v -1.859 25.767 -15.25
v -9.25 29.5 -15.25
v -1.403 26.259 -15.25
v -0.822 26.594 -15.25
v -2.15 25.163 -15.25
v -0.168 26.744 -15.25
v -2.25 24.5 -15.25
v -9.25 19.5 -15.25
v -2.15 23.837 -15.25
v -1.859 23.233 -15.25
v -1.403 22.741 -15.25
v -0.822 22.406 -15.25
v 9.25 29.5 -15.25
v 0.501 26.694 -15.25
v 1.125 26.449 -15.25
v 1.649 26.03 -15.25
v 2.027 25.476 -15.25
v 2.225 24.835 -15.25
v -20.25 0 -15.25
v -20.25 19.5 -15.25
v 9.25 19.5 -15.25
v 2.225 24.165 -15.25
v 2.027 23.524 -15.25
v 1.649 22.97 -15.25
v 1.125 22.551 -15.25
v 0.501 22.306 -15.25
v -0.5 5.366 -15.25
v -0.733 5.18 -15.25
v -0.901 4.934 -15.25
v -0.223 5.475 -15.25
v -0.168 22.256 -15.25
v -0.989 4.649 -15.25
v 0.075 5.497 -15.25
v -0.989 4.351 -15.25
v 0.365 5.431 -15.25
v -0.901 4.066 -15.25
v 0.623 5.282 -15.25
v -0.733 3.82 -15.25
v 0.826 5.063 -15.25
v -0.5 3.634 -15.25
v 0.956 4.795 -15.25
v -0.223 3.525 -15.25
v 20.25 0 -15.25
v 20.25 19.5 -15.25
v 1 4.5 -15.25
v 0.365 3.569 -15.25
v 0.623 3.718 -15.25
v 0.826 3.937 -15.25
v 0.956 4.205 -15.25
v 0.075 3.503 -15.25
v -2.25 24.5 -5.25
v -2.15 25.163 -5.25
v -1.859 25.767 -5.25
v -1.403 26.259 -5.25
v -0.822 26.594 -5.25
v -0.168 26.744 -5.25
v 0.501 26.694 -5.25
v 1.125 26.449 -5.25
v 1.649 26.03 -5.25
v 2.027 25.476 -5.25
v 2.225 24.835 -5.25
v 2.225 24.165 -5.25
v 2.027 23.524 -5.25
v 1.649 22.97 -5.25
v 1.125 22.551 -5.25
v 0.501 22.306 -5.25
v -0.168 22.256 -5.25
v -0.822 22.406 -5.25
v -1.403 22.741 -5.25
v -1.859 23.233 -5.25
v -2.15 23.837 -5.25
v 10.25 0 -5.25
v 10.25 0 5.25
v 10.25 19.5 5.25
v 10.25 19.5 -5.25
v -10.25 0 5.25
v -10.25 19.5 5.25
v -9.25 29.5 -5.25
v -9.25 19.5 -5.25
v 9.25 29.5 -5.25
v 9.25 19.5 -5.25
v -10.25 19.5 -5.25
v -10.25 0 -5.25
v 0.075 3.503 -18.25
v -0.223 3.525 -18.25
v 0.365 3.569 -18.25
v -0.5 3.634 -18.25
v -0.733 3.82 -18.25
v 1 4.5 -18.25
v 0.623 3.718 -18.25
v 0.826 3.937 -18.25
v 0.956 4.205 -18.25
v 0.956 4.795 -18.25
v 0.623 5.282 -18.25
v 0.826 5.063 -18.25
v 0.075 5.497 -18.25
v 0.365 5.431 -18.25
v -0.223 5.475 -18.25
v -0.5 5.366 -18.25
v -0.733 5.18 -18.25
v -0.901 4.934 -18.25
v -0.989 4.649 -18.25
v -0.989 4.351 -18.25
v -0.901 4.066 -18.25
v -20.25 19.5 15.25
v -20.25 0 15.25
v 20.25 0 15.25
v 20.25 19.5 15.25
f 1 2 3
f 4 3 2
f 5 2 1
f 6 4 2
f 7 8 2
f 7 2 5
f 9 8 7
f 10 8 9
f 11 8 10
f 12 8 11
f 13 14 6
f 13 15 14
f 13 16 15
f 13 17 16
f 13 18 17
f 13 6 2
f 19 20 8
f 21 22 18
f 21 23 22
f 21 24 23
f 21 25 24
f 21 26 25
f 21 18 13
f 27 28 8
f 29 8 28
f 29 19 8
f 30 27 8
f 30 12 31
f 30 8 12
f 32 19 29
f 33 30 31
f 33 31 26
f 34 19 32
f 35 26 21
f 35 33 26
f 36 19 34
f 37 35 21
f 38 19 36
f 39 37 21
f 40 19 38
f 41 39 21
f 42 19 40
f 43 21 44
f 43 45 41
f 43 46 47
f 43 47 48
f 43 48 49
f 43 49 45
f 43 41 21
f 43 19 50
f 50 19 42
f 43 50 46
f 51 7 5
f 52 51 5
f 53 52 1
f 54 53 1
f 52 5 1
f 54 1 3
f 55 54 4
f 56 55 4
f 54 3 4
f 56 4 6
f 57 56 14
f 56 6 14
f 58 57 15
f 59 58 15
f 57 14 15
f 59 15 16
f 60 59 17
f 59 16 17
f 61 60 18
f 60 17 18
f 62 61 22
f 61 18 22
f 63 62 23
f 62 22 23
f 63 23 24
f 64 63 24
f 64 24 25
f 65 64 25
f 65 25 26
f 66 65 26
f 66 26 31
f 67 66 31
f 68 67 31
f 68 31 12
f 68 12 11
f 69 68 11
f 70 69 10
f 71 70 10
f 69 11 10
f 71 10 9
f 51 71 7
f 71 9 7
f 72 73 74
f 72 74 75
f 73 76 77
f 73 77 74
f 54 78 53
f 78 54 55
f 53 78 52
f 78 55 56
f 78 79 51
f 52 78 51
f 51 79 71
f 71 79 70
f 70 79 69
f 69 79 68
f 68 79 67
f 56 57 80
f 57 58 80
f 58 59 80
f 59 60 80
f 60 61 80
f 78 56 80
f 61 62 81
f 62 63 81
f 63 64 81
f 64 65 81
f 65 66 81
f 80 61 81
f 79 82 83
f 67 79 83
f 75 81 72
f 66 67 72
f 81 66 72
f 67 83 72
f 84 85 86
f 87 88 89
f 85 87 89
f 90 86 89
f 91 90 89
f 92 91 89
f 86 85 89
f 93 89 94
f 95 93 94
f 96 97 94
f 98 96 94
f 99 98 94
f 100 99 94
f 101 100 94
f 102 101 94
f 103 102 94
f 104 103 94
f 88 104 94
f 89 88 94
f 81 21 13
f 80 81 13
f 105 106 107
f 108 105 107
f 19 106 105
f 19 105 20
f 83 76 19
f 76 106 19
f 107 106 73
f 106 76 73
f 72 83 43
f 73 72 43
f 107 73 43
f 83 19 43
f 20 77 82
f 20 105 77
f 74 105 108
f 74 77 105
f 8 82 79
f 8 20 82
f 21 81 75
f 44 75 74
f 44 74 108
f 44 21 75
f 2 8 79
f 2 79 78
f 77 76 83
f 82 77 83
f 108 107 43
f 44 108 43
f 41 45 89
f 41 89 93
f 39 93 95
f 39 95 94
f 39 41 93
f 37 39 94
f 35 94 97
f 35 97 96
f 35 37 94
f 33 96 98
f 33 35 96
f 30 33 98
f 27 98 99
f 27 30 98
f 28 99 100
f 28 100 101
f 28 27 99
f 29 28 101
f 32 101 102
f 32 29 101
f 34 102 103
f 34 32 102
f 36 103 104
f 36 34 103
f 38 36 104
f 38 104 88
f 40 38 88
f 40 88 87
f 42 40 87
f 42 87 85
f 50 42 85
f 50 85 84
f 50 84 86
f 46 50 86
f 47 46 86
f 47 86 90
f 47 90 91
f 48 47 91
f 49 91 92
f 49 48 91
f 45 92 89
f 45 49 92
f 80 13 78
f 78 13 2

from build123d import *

# Parameters (mm, degrees)
SKETCH1_W           = 40.5
SKETCH1_H           = 30.5
SKETCH1_W_2         = 20.5
SKETCH1_H_2         = 10.5
BOSS_EXTRUDE1_DEPTH = 19.5
SKETCH4_R           = 1
BOSS_EXTRUDE2_DEPTH = 3
SKETCH3_W           = 18.5
SKETCH3_H           = 10
SKETCH3_R           = 2.25
BOSS_EXTRUDE3_DEPTH = 10


with BuildPart() as part:
    # Sketch1 → Boss-Extrude1 (new body)
    with BuildSketch(Plane(origin=(0, 0, 0), x_dir=(1, 0, 0), z_dir=(0, 1, 0))):
        Rectangle(SKETCH1_W, SKETCH1_H)
        Rectangle(SKETCH1_W_2, SKETCH1_H_2, mode=Mode.SUBTRACT)
    extrude(amount=BOSS_EXTRUDE1_DEPTH)

    # Sketch4 → Boss-Extrude2 (add)
    with BuildSketch(Plane.XY.offset(-15.25)):
        with Locations((0, 4.5)):
            Circle(SKETCH4_R)
    extrude(amount=-BOSS_EXTRUDE2_DEPTH)

    # Sketch3 → Boss-Extrude3 (add)
    with BuildSketch(Plane(origin=(0, 0, -15.25), x_dir=(-1, 0, 0), z_dir=(0, 0, -1))):
        with Locations((0, 24.5)):
            Rectangle(SKETCH3_W, SKETCH3_H)
        with Locations((0, 24.5)):
            Circle(SKETCH3_R, mode=Mode.SUBTRACT)
    extrude(amount=-BOSS_EXTRUDE3_DEPTH)


solid = part.part
